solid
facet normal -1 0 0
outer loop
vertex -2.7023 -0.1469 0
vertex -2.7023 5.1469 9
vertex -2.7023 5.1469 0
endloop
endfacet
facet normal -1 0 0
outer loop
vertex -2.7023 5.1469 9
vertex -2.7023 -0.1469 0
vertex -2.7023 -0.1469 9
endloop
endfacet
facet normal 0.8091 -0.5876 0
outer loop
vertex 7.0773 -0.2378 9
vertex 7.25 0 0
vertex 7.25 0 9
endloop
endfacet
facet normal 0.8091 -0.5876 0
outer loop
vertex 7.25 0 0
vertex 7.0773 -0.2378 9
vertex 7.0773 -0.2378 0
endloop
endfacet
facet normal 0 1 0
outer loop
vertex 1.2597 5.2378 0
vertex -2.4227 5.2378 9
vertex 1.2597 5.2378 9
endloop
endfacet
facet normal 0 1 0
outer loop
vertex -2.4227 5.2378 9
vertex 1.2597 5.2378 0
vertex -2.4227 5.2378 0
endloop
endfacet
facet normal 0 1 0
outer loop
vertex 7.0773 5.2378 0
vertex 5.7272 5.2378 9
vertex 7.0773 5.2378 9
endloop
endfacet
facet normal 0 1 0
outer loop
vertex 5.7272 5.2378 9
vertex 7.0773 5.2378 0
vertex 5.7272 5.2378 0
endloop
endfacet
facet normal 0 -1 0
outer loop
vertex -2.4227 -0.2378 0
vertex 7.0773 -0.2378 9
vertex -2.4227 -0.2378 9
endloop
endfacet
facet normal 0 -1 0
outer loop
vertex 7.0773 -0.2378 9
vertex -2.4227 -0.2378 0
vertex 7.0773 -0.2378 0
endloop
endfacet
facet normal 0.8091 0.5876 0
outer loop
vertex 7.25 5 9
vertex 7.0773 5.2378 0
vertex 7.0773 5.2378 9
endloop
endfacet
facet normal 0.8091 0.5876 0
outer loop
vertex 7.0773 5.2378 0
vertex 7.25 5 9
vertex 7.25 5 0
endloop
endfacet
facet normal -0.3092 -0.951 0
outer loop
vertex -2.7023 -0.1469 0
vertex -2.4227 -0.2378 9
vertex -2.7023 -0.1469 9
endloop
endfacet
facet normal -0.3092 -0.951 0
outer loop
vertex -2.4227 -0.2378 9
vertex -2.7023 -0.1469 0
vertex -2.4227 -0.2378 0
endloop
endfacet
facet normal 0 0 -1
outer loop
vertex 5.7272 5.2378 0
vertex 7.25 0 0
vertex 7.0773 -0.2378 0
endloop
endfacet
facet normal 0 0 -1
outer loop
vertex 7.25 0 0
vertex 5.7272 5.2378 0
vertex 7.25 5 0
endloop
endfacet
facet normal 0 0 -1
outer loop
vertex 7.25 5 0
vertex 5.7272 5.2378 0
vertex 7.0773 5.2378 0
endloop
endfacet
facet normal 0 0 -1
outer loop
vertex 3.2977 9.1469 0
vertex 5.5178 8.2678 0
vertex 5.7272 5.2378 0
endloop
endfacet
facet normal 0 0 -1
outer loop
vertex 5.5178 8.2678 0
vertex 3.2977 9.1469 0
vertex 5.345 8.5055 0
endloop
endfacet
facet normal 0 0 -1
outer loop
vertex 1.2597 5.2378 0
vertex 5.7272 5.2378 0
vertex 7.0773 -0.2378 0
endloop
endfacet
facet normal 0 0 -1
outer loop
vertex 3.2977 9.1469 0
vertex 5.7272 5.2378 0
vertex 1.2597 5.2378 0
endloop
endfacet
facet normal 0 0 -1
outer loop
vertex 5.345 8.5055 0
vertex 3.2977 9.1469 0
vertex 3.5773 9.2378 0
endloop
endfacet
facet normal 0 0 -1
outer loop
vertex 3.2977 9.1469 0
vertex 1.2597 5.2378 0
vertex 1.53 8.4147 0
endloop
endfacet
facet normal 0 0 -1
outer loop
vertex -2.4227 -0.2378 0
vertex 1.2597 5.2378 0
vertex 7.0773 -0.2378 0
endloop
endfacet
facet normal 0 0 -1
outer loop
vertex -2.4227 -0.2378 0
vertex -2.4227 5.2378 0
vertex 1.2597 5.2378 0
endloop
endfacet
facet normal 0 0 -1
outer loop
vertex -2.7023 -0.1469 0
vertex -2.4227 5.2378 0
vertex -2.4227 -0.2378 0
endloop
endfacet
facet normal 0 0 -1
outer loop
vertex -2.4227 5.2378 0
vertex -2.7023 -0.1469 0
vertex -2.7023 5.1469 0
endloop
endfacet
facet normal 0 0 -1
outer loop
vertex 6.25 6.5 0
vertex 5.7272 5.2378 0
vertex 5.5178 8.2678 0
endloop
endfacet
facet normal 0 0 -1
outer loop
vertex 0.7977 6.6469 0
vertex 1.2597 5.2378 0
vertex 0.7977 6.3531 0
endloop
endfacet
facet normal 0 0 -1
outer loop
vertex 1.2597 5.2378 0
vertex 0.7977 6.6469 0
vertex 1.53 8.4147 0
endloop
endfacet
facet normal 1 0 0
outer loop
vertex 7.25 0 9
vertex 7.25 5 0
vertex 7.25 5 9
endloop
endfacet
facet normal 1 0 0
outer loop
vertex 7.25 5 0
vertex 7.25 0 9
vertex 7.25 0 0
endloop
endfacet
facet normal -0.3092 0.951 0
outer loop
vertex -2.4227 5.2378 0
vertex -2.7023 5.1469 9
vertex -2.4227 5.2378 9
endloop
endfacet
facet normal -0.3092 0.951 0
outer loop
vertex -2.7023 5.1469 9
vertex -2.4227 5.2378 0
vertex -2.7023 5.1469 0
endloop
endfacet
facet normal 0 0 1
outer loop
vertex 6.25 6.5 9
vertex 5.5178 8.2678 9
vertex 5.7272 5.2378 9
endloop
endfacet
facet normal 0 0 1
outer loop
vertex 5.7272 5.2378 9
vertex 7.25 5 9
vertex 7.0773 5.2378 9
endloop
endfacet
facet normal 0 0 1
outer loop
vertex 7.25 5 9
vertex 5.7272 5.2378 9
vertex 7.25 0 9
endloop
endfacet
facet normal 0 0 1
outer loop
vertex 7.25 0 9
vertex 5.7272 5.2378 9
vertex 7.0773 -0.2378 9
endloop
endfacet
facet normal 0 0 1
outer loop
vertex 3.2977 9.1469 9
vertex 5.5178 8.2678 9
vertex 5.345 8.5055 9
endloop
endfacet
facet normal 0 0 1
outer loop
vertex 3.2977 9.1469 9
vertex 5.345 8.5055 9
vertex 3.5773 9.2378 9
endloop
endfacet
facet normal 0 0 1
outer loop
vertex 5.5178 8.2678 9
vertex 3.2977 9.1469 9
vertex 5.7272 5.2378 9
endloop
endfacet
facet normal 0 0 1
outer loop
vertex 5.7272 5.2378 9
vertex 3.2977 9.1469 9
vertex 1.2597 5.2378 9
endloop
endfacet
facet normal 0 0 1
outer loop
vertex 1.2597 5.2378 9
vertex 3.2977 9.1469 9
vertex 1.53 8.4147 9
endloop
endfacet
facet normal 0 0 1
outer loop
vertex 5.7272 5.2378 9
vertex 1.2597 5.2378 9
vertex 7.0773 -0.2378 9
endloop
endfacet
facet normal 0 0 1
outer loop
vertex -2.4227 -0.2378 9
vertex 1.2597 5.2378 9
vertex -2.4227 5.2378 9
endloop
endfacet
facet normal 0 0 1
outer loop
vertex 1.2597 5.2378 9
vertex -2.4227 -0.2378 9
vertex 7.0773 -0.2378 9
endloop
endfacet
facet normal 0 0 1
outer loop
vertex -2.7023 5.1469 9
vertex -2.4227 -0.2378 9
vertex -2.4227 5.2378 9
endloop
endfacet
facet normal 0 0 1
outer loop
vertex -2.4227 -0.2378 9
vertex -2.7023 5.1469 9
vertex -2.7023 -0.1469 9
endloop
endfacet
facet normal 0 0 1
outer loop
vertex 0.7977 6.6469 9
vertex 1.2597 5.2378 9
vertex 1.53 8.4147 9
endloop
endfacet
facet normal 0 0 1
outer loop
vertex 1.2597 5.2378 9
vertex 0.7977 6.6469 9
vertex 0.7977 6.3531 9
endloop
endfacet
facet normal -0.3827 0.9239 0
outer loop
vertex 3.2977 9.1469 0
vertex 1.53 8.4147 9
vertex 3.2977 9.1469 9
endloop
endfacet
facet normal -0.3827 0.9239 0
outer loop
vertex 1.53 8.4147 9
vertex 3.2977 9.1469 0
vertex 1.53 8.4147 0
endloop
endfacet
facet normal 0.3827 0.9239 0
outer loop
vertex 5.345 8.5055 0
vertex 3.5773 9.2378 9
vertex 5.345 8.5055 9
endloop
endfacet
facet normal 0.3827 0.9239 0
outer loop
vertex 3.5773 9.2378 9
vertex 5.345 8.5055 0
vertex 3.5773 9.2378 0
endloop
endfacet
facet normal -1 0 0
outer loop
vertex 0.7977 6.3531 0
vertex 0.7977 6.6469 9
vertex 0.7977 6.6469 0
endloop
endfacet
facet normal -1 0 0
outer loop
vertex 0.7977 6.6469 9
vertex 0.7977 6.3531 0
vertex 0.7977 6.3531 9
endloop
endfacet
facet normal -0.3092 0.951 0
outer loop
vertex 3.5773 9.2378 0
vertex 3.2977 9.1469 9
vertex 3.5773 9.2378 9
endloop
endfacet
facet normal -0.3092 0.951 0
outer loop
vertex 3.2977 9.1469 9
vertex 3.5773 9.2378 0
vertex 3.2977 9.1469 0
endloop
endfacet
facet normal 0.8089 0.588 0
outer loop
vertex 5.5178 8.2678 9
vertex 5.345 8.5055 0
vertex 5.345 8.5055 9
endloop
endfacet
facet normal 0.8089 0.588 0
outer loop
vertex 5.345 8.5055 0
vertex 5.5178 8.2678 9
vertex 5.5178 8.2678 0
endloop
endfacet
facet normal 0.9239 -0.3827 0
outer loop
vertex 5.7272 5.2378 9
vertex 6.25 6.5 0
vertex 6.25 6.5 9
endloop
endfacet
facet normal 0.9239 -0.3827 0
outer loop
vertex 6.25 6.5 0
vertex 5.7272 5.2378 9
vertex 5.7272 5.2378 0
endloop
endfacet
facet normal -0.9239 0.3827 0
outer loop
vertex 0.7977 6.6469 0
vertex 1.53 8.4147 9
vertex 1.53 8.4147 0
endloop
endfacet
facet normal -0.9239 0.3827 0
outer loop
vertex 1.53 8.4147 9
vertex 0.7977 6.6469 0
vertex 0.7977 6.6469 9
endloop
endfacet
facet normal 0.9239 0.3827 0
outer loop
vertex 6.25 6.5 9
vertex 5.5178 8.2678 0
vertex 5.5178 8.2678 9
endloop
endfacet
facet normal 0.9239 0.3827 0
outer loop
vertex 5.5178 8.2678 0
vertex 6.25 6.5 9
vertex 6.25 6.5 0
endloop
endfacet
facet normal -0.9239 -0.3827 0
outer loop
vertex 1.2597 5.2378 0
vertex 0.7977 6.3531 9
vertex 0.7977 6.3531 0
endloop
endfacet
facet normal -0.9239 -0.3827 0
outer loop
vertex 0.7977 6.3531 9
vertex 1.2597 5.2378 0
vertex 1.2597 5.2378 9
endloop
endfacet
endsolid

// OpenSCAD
// corpus 1447730 / 932409: a non-uniform scale() leaves every plane a flat B-spline — still a prism,
// still summed as 2D sections extruded, not tessellated.
minkowski() {
  scale([1, 1, 2]) union() {
    cube([7, 5, 4]);
    translate([3.5, 6.5, 0]) cylinder(d = 5, h = 4);
    translate([-2.5, 0, 0]) cube([5, 5, 4]);
  }
  cylinder(d = 0.5, h = 1);
}
